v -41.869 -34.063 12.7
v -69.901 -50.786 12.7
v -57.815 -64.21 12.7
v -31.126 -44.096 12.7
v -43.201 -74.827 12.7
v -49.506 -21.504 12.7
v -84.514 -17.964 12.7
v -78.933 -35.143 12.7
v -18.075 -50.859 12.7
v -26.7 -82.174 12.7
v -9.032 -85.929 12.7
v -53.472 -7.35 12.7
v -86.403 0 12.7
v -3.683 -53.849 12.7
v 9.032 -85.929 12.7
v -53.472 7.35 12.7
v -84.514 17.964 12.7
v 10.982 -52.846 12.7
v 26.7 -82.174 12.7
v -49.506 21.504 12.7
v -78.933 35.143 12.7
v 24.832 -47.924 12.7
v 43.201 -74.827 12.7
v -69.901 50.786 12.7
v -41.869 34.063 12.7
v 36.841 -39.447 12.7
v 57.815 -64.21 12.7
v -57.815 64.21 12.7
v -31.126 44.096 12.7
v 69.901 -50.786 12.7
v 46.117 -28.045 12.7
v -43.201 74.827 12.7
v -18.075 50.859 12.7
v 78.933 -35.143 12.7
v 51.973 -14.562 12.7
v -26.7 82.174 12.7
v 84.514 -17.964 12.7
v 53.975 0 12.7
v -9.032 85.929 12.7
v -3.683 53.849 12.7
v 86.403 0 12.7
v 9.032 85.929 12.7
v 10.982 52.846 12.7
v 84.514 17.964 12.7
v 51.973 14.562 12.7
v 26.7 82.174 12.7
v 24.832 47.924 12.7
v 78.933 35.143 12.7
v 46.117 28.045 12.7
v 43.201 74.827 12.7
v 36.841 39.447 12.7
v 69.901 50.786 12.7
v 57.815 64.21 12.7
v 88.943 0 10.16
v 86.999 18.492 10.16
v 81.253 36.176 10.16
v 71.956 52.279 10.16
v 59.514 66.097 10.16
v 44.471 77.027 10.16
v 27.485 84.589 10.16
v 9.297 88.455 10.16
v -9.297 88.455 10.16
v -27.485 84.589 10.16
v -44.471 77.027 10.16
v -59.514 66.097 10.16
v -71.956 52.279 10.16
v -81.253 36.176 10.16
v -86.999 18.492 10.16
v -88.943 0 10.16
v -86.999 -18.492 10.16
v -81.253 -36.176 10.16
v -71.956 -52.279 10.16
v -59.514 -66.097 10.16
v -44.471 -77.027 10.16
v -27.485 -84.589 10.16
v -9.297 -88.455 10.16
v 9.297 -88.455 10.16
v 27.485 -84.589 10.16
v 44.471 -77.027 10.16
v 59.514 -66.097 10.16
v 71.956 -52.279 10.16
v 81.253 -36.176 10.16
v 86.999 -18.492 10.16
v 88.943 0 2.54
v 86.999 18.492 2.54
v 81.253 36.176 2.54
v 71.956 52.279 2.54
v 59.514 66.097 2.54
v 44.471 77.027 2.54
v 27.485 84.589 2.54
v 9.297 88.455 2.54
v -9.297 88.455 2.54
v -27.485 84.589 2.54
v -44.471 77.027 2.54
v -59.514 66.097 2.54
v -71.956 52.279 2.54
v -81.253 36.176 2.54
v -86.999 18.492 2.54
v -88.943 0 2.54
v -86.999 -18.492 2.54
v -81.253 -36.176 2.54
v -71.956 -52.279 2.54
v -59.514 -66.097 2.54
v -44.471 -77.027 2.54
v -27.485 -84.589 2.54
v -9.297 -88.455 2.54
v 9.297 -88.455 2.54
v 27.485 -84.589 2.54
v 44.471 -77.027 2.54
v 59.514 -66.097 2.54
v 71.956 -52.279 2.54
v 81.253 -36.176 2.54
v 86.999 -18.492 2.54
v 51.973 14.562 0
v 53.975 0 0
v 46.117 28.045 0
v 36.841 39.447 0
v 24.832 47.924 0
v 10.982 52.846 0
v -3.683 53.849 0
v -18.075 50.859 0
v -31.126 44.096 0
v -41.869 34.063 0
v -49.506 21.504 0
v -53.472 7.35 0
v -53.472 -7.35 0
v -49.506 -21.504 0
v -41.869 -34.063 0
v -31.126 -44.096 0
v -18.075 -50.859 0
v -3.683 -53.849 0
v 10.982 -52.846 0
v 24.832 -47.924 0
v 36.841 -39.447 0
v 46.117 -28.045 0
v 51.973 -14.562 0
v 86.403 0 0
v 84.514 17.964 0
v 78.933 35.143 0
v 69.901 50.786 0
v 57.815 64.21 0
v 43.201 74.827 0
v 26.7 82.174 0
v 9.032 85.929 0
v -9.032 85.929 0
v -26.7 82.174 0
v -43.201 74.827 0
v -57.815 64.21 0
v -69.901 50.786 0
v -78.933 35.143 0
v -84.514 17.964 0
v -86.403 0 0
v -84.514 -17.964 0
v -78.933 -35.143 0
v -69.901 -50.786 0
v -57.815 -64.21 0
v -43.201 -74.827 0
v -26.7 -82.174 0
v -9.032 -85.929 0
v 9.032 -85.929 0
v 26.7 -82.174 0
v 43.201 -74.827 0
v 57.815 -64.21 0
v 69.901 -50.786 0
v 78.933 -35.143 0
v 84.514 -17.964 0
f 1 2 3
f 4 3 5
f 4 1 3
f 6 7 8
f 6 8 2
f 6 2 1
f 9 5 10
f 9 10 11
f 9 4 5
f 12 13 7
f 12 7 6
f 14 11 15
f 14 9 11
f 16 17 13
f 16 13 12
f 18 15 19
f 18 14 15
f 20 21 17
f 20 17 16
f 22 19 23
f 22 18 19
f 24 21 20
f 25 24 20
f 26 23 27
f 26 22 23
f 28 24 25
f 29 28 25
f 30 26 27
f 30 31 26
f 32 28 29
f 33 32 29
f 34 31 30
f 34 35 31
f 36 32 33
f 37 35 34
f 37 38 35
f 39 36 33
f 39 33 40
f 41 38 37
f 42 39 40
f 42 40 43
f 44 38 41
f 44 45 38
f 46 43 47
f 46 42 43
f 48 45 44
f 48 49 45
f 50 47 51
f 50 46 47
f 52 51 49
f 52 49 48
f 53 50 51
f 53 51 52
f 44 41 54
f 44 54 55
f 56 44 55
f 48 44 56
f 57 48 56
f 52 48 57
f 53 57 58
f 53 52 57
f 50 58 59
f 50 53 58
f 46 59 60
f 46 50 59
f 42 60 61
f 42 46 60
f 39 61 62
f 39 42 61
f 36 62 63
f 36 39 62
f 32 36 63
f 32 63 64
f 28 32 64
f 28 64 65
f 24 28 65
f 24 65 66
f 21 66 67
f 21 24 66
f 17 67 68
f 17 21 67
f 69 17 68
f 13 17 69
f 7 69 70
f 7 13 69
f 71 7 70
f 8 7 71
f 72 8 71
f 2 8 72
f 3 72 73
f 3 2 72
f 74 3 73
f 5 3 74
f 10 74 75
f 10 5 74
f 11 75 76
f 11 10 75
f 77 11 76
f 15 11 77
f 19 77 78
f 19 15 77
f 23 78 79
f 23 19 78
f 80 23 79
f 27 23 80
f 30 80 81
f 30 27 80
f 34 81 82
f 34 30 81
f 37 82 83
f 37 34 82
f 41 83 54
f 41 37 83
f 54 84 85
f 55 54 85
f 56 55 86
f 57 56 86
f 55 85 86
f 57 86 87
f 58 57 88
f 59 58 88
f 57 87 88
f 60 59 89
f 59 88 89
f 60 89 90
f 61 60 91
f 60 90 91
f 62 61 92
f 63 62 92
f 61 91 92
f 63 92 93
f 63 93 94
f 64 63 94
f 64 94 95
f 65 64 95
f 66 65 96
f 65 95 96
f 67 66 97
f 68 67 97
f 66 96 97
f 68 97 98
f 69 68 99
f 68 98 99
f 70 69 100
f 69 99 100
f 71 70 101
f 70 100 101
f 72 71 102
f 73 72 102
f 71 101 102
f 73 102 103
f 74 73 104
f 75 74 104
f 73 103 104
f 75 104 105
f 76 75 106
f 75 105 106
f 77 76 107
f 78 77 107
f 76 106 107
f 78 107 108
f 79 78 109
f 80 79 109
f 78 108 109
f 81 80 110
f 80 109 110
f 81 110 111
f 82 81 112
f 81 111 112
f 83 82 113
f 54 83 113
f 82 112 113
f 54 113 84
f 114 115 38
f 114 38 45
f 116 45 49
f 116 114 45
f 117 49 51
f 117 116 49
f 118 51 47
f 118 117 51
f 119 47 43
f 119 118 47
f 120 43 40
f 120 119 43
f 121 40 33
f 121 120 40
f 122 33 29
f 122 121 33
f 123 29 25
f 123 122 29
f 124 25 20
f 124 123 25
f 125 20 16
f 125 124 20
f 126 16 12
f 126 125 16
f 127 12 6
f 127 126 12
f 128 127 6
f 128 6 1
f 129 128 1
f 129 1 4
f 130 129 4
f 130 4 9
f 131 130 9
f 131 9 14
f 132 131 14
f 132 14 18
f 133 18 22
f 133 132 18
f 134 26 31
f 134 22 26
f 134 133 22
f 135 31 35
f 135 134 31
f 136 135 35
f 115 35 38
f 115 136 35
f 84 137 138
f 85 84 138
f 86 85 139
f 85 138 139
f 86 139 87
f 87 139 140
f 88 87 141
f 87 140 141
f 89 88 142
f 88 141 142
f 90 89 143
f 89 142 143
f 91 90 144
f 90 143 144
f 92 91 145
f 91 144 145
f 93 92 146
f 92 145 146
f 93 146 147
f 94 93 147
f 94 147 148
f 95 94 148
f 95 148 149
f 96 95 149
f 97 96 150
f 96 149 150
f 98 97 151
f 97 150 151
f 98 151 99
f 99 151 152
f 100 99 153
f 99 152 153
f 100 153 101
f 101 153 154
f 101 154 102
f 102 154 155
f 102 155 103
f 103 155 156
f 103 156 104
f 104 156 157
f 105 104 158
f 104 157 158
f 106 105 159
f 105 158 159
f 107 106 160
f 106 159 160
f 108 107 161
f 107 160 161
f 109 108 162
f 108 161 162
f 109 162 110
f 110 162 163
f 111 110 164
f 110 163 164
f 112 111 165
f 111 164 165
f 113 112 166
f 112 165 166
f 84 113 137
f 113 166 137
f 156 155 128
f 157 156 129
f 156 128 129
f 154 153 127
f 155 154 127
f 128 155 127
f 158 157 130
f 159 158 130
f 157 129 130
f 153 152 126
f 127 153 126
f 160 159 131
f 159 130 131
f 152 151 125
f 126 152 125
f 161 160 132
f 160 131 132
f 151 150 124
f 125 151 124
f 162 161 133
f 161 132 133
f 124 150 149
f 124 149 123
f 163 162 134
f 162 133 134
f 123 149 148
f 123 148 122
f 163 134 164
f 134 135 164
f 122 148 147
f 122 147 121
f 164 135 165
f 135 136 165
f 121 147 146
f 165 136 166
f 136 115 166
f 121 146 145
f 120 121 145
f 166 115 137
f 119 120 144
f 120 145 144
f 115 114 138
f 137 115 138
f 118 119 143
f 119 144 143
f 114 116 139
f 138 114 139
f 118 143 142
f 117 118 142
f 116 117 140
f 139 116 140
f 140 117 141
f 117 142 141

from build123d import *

# Parameters (mm, degrees)
F0_R     = 88.94259
F1_DEPTH = 12.7
F2_SIZE  = 2.54
F3_SIZE  = 2.54
F4_R     = 53.975015
F5_DEPTH = 50.8


with BuildPart() as f1:
    # F0 (on Top) → F1 (new body)
    with BuildSketch(Plane.XY):
        Circle(F0_R)
    extrude(amount=F1_DEPTH)

    # F2
    f2_edges = [f1.edges().sort_by_distance(p)[0] for p in [
        (-88.94259, 0, 12.7),
    ]]
    chamfer(f2_edges, length=F2_SIZE)

    # F3
    f3_edges = [f1.edges().sort_by_distance(p)[0] for p in [
        (-88.94259, 0, 0),
    ]]
    chamfer(f3_edges, length=F3_SIZE)

    # F4 (on Top) → F5 (cut)
    with BuildSketch(Plane.XY):
        Circle(F4_R)
    extrude(amount=F5_DEPTH, mode=Mode.SUBTRACT)


solid = f1.part
